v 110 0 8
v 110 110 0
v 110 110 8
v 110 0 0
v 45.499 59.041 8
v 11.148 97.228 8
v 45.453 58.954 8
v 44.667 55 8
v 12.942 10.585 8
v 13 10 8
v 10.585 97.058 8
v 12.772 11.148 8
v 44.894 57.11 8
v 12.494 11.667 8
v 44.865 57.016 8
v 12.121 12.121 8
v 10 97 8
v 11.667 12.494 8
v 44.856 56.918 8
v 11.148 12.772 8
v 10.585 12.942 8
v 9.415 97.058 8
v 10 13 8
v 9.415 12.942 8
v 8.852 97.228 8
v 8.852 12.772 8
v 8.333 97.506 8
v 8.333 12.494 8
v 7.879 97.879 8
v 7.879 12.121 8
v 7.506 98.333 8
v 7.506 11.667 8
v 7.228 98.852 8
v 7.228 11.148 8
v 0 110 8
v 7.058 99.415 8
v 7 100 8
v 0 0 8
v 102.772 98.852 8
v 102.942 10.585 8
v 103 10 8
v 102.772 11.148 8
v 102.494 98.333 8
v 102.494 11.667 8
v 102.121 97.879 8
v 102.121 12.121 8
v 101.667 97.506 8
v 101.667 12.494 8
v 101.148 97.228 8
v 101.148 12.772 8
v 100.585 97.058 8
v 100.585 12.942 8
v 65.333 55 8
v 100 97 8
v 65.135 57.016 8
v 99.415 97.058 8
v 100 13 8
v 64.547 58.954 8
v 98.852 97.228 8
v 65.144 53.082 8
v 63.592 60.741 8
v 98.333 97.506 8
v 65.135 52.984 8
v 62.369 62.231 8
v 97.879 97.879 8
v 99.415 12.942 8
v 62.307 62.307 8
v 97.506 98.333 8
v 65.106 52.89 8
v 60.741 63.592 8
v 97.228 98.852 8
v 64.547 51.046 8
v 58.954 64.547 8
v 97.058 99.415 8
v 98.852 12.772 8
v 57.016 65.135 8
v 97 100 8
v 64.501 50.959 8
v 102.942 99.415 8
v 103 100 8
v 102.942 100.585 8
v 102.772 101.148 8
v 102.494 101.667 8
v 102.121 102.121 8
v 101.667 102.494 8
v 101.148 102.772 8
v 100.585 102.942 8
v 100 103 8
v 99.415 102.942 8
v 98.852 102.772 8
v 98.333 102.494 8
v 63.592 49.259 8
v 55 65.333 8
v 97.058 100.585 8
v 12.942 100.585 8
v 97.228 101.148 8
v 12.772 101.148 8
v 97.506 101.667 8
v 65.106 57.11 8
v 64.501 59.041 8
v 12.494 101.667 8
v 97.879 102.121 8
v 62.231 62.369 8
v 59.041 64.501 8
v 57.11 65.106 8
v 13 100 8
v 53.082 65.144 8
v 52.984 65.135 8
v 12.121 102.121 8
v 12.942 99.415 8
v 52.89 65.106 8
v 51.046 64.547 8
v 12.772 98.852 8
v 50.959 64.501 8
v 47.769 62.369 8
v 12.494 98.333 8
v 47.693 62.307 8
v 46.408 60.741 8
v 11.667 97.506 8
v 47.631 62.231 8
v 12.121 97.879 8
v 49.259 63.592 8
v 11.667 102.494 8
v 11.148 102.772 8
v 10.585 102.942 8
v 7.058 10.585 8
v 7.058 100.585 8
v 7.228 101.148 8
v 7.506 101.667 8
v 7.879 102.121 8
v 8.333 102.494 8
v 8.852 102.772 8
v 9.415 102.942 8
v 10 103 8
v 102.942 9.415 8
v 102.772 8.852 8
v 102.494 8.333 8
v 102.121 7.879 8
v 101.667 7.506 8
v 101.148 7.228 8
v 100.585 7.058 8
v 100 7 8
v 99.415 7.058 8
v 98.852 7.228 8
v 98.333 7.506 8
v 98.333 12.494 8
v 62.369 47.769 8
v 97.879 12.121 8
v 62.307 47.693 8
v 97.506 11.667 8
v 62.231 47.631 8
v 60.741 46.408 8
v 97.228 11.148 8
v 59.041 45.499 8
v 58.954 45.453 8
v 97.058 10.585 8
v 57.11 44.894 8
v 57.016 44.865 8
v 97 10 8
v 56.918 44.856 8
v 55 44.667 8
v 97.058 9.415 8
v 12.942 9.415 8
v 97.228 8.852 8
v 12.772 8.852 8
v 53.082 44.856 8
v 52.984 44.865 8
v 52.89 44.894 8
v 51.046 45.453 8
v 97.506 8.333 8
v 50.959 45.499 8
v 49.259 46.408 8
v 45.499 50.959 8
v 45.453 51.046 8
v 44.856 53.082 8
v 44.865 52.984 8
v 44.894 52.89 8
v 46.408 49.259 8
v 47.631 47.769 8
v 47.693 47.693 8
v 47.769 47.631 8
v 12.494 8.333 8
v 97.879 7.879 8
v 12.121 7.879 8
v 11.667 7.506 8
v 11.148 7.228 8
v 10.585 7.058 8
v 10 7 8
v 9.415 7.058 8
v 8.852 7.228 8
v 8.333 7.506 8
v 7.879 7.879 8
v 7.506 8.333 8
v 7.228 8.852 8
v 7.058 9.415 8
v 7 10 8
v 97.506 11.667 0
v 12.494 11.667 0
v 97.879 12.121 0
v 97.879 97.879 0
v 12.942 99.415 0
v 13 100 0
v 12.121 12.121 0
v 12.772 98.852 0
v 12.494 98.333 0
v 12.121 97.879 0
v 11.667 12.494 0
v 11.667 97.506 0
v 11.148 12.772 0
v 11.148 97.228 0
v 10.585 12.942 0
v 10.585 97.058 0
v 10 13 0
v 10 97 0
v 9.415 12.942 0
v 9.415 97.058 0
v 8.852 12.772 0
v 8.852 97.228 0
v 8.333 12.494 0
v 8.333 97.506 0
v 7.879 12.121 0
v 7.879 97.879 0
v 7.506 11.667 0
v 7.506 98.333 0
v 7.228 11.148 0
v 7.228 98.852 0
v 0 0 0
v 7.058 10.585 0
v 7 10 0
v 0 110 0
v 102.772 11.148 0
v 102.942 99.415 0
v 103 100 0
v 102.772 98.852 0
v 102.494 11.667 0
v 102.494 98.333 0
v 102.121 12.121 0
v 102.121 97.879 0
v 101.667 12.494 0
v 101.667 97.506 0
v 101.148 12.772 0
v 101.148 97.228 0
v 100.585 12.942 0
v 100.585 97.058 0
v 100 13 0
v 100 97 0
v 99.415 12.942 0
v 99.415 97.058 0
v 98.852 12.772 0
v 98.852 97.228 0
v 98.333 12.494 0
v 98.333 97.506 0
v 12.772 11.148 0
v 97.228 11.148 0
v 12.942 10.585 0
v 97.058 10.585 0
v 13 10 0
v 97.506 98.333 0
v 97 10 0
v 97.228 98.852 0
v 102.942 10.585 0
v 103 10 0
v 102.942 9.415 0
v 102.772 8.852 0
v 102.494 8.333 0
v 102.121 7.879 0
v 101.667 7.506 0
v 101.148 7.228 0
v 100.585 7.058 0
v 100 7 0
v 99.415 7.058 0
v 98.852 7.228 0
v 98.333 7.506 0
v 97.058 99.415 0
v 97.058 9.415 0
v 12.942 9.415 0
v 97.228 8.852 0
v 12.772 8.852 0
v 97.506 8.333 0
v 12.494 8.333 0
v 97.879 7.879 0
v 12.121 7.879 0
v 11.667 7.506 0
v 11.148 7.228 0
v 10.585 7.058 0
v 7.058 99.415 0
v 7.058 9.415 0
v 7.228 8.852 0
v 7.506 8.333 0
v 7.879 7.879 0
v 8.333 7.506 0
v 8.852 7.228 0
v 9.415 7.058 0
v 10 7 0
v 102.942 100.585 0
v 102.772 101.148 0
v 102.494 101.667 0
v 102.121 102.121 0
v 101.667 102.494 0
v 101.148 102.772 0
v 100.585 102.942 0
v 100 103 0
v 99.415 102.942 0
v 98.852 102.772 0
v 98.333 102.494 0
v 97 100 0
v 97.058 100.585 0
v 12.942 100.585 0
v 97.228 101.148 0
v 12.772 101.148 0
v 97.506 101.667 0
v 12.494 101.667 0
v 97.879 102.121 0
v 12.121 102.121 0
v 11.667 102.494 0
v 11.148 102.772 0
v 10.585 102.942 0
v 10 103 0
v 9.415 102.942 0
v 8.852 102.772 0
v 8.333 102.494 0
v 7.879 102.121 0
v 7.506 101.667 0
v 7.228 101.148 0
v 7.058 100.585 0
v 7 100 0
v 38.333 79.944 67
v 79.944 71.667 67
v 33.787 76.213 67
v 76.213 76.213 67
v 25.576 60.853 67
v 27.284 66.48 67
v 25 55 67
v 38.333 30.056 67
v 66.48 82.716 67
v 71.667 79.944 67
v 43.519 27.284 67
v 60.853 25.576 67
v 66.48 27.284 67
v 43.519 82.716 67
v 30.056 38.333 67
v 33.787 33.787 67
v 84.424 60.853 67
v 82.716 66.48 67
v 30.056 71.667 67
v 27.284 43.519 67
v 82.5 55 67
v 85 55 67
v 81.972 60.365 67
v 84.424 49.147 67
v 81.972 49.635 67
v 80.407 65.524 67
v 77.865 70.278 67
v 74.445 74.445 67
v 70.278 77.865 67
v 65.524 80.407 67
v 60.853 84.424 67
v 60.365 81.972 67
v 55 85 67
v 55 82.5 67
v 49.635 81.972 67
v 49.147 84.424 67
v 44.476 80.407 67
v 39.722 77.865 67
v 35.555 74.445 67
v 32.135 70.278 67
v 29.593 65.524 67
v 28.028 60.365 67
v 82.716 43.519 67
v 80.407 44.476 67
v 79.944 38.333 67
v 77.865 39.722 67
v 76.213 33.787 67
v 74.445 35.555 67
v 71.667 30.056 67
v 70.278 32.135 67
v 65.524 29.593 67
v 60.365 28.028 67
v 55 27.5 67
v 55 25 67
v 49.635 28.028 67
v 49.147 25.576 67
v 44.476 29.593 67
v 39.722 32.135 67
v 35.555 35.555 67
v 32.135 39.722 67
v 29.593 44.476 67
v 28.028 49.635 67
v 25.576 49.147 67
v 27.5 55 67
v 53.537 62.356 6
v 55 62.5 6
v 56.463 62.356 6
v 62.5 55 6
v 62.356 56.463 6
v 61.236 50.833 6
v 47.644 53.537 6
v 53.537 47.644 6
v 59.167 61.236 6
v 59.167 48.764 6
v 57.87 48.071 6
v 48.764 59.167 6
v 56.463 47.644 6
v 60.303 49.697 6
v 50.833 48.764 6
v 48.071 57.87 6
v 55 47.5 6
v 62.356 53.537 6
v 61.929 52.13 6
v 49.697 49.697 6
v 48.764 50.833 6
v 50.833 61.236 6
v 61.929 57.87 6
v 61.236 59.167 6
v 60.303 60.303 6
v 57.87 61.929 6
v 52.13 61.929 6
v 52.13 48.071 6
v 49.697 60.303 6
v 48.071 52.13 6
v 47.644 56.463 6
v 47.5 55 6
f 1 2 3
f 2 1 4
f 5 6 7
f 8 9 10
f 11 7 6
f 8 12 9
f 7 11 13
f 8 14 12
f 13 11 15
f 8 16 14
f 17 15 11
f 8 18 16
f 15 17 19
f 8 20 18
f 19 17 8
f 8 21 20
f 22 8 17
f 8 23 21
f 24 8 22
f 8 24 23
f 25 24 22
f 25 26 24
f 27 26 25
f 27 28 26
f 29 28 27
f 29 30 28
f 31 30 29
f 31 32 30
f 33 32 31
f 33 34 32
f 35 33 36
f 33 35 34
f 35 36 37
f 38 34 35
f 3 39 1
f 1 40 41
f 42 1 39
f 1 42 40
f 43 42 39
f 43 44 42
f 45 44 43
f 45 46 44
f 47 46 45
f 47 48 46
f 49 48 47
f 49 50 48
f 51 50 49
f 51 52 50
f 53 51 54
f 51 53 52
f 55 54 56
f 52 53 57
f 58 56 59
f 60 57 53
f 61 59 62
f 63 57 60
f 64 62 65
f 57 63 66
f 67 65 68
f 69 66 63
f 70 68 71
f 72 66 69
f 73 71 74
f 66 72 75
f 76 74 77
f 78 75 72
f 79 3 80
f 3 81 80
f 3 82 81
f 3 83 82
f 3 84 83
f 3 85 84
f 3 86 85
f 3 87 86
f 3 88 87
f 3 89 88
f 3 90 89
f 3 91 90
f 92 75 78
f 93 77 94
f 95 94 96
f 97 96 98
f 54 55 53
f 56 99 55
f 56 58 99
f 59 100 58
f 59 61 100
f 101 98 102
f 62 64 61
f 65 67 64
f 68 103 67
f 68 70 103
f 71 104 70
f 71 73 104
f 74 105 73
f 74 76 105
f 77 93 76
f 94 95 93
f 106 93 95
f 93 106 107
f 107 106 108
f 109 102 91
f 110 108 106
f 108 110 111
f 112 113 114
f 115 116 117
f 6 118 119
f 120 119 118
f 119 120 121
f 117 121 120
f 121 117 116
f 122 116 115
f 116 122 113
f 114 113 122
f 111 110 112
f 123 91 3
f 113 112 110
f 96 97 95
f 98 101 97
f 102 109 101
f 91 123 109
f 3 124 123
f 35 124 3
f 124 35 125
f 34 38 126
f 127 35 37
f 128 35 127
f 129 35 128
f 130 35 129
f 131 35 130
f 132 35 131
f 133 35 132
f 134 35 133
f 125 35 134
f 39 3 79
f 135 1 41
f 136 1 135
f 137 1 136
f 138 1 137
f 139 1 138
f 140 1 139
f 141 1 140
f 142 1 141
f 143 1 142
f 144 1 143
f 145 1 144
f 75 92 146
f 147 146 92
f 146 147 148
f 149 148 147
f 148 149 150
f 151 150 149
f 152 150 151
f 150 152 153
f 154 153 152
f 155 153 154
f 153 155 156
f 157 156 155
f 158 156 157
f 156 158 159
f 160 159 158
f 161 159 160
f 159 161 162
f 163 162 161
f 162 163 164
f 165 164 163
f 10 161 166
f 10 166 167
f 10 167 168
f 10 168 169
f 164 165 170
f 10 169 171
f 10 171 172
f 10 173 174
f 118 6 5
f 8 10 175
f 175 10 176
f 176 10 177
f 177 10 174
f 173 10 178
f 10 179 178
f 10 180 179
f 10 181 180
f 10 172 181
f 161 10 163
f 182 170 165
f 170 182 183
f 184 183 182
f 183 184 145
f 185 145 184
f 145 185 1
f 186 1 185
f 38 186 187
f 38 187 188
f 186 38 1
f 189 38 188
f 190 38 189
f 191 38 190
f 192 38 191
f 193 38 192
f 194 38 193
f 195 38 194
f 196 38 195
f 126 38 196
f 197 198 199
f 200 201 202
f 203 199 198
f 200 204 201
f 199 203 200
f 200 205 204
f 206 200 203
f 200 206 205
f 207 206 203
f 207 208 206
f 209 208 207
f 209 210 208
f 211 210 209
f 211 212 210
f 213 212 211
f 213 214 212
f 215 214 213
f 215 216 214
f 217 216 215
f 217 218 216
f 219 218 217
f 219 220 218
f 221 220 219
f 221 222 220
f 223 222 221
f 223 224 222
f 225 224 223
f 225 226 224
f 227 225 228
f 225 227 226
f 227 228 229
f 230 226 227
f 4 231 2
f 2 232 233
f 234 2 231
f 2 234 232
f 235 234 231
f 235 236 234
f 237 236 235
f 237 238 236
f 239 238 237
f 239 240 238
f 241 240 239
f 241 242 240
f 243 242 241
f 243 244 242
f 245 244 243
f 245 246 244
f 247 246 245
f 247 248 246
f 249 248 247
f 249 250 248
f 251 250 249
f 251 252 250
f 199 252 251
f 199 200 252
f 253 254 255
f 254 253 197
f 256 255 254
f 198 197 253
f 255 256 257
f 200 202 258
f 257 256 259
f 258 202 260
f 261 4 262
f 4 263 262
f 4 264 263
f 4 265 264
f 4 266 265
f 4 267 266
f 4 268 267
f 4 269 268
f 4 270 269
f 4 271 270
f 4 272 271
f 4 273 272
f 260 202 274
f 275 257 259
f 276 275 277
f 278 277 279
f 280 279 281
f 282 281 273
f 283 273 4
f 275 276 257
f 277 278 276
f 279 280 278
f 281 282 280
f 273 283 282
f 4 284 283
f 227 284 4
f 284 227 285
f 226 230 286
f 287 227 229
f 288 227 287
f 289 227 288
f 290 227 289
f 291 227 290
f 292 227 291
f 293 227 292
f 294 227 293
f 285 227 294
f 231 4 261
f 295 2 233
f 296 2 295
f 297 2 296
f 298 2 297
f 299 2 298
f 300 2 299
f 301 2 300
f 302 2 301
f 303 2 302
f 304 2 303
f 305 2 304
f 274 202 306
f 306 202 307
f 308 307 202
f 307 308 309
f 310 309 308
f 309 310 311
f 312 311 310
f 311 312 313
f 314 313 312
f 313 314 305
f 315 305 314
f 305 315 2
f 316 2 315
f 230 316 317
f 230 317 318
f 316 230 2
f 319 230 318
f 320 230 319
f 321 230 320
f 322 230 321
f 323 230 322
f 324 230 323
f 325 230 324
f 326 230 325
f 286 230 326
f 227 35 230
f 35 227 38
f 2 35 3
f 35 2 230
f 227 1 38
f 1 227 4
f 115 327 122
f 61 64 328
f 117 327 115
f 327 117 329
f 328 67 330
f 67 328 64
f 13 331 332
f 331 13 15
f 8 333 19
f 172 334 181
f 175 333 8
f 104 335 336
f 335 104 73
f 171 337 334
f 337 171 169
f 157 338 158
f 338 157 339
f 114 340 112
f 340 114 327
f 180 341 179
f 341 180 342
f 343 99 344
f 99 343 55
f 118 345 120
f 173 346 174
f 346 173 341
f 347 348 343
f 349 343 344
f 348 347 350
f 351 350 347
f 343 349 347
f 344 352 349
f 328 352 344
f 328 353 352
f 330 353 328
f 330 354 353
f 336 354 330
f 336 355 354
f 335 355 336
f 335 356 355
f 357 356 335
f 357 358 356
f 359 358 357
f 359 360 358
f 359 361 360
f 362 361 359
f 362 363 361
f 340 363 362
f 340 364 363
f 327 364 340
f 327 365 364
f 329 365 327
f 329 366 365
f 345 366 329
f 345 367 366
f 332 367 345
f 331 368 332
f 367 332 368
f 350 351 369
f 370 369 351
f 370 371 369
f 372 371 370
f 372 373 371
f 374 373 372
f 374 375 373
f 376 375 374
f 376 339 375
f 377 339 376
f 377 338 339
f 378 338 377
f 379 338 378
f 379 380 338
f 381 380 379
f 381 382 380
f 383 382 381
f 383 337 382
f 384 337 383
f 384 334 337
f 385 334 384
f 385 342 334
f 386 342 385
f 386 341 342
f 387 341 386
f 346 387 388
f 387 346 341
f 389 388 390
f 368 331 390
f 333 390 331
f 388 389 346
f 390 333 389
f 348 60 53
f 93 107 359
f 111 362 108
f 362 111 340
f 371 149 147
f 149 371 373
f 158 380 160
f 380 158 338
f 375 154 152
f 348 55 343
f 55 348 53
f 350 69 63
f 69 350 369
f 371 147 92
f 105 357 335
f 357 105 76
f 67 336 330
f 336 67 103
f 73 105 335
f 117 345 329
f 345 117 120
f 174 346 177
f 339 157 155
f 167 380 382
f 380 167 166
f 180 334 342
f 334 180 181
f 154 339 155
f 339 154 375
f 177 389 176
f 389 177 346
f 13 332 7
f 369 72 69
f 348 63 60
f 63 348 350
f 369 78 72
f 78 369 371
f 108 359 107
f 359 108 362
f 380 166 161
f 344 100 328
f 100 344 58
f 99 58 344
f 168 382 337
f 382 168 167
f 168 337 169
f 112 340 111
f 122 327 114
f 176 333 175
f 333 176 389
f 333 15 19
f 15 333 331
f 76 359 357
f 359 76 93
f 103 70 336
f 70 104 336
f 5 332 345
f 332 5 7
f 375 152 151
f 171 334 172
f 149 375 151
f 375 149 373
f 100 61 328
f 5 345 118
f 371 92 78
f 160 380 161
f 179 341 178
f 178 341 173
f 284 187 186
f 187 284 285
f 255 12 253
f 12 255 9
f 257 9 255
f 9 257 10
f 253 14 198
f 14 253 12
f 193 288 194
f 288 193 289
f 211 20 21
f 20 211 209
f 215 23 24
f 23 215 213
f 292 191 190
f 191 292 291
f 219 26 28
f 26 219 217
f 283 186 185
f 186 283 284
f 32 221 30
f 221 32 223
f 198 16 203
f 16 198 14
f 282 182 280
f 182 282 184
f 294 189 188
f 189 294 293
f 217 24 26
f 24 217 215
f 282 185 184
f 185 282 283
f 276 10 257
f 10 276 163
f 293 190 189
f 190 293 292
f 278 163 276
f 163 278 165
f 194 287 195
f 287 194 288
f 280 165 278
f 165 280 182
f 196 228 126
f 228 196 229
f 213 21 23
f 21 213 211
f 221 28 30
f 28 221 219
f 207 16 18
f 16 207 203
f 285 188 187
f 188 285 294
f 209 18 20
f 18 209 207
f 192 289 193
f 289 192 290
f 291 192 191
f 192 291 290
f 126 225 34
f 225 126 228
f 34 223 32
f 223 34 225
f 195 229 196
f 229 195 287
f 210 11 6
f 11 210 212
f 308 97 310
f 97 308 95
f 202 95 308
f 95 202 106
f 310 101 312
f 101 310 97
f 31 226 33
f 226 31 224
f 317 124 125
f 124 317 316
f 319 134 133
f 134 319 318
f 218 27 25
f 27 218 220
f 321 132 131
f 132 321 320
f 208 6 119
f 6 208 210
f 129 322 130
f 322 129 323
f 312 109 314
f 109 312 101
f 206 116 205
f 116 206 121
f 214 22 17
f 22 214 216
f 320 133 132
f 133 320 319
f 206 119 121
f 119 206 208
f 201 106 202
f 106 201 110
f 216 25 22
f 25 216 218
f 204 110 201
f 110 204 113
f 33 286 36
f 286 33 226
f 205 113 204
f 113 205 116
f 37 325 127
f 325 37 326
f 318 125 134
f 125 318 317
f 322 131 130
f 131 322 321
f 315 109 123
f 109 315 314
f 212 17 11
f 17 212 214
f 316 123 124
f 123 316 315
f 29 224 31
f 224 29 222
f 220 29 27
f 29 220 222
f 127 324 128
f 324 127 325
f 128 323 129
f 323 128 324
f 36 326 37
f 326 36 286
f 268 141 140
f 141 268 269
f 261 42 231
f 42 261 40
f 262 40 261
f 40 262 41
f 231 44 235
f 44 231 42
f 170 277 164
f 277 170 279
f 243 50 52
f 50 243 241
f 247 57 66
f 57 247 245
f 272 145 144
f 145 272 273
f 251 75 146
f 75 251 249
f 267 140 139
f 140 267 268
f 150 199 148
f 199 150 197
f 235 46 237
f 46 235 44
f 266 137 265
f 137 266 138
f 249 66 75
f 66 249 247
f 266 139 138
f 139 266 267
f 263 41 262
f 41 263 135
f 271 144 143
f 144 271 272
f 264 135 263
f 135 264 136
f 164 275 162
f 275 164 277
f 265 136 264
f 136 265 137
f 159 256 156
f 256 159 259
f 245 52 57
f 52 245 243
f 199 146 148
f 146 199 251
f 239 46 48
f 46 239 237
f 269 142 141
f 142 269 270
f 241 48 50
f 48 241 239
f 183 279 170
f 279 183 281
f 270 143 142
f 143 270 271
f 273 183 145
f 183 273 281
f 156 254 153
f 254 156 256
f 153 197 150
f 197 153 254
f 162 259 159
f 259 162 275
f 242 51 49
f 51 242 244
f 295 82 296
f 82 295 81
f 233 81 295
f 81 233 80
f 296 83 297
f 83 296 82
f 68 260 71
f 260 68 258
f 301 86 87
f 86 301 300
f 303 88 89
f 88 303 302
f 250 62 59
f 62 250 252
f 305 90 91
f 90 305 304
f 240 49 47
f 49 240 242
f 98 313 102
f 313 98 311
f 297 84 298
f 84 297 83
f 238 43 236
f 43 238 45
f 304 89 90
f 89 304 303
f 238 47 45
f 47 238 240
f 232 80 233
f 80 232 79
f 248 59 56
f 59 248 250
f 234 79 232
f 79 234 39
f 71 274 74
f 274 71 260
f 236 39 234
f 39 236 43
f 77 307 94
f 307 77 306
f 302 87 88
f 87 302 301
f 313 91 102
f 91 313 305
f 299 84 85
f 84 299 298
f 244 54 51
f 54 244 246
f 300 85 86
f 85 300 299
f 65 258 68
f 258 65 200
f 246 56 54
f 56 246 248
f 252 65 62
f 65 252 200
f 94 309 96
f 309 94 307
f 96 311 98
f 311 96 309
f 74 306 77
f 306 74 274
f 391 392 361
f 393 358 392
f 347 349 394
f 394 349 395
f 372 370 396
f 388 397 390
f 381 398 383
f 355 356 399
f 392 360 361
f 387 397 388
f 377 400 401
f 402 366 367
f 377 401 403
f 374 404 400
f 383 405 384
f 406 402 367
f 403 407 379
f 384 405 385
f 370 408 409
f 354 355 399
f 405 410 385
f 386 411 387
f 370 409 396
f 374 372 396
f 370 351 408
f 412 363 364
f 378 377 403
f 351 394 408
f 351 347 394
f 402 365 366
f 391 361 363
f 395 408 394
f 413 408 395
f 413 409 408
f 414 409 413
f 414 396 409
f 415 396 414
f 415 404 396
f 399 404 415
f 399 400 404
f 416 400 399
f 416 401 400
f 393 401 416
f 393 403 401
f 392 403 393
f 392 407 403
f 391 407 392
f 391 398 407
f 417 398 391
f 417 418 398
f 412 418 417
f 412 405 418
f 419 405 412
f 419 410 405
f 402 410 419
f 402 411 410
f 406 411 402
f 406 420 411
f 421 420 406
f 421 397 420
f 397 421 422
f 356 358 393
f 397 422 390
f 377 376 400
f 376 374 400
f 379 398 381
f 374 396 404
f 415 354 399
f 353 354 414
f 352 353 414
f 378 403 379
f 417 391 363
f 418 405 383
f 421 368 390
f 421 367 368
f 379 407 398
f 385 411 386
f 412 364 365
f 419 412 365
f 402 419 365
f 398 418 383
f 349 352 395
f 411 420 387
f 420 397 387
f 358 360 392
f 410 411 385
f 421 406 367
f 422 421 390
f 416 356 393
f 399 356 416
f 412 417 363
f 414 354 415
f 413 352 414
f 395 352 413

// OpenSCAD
$fn = 32;

// ----------------------------------------------------------------------
// Hopper: flanged with square flange
// ----------------------------------------------------------------------

// --- parameters (mm) ---
fl = 110;                 // flange side, X and Y
fl_t = 8;                 // flange thickness
cone_h = 60;              // cone height above the flange
top_d = 60;               // cone mouth diameter
bot_d = 20;               // cone spout diameter
wall = 2.5;               // cone wall thickness
hole_r = 3;               // flange hole radius
hole_in = 10;             // hole inset from the corners

bore_d = bot_d - 2 * wall;  // spout bore diameter
total_h = fl_t + cone_h - 1;  // overall height

difference() {
  union() {
    cube([fl, fl, fl_t]);
    translate([fl / 2, fl / 2, fl_t - 1])
      cylinder(h = cone_h, d1 = bot_d, d2 = top_d);
  }
  translate([fl / 2, fl / 2, fl_t - 2])
    cylinder(h = cone_h + 1, d1 = bore_d, d2 = top_d - 2 * wall);
  for (sx = [0, 1], sy = [0, 1])
    translate([sx ? fl - hole_in : hole_in,
               sy ? fl - hole_in : hole_in, -1])
      cylinder(r = hole_r, h = fl_t + 2);
}
